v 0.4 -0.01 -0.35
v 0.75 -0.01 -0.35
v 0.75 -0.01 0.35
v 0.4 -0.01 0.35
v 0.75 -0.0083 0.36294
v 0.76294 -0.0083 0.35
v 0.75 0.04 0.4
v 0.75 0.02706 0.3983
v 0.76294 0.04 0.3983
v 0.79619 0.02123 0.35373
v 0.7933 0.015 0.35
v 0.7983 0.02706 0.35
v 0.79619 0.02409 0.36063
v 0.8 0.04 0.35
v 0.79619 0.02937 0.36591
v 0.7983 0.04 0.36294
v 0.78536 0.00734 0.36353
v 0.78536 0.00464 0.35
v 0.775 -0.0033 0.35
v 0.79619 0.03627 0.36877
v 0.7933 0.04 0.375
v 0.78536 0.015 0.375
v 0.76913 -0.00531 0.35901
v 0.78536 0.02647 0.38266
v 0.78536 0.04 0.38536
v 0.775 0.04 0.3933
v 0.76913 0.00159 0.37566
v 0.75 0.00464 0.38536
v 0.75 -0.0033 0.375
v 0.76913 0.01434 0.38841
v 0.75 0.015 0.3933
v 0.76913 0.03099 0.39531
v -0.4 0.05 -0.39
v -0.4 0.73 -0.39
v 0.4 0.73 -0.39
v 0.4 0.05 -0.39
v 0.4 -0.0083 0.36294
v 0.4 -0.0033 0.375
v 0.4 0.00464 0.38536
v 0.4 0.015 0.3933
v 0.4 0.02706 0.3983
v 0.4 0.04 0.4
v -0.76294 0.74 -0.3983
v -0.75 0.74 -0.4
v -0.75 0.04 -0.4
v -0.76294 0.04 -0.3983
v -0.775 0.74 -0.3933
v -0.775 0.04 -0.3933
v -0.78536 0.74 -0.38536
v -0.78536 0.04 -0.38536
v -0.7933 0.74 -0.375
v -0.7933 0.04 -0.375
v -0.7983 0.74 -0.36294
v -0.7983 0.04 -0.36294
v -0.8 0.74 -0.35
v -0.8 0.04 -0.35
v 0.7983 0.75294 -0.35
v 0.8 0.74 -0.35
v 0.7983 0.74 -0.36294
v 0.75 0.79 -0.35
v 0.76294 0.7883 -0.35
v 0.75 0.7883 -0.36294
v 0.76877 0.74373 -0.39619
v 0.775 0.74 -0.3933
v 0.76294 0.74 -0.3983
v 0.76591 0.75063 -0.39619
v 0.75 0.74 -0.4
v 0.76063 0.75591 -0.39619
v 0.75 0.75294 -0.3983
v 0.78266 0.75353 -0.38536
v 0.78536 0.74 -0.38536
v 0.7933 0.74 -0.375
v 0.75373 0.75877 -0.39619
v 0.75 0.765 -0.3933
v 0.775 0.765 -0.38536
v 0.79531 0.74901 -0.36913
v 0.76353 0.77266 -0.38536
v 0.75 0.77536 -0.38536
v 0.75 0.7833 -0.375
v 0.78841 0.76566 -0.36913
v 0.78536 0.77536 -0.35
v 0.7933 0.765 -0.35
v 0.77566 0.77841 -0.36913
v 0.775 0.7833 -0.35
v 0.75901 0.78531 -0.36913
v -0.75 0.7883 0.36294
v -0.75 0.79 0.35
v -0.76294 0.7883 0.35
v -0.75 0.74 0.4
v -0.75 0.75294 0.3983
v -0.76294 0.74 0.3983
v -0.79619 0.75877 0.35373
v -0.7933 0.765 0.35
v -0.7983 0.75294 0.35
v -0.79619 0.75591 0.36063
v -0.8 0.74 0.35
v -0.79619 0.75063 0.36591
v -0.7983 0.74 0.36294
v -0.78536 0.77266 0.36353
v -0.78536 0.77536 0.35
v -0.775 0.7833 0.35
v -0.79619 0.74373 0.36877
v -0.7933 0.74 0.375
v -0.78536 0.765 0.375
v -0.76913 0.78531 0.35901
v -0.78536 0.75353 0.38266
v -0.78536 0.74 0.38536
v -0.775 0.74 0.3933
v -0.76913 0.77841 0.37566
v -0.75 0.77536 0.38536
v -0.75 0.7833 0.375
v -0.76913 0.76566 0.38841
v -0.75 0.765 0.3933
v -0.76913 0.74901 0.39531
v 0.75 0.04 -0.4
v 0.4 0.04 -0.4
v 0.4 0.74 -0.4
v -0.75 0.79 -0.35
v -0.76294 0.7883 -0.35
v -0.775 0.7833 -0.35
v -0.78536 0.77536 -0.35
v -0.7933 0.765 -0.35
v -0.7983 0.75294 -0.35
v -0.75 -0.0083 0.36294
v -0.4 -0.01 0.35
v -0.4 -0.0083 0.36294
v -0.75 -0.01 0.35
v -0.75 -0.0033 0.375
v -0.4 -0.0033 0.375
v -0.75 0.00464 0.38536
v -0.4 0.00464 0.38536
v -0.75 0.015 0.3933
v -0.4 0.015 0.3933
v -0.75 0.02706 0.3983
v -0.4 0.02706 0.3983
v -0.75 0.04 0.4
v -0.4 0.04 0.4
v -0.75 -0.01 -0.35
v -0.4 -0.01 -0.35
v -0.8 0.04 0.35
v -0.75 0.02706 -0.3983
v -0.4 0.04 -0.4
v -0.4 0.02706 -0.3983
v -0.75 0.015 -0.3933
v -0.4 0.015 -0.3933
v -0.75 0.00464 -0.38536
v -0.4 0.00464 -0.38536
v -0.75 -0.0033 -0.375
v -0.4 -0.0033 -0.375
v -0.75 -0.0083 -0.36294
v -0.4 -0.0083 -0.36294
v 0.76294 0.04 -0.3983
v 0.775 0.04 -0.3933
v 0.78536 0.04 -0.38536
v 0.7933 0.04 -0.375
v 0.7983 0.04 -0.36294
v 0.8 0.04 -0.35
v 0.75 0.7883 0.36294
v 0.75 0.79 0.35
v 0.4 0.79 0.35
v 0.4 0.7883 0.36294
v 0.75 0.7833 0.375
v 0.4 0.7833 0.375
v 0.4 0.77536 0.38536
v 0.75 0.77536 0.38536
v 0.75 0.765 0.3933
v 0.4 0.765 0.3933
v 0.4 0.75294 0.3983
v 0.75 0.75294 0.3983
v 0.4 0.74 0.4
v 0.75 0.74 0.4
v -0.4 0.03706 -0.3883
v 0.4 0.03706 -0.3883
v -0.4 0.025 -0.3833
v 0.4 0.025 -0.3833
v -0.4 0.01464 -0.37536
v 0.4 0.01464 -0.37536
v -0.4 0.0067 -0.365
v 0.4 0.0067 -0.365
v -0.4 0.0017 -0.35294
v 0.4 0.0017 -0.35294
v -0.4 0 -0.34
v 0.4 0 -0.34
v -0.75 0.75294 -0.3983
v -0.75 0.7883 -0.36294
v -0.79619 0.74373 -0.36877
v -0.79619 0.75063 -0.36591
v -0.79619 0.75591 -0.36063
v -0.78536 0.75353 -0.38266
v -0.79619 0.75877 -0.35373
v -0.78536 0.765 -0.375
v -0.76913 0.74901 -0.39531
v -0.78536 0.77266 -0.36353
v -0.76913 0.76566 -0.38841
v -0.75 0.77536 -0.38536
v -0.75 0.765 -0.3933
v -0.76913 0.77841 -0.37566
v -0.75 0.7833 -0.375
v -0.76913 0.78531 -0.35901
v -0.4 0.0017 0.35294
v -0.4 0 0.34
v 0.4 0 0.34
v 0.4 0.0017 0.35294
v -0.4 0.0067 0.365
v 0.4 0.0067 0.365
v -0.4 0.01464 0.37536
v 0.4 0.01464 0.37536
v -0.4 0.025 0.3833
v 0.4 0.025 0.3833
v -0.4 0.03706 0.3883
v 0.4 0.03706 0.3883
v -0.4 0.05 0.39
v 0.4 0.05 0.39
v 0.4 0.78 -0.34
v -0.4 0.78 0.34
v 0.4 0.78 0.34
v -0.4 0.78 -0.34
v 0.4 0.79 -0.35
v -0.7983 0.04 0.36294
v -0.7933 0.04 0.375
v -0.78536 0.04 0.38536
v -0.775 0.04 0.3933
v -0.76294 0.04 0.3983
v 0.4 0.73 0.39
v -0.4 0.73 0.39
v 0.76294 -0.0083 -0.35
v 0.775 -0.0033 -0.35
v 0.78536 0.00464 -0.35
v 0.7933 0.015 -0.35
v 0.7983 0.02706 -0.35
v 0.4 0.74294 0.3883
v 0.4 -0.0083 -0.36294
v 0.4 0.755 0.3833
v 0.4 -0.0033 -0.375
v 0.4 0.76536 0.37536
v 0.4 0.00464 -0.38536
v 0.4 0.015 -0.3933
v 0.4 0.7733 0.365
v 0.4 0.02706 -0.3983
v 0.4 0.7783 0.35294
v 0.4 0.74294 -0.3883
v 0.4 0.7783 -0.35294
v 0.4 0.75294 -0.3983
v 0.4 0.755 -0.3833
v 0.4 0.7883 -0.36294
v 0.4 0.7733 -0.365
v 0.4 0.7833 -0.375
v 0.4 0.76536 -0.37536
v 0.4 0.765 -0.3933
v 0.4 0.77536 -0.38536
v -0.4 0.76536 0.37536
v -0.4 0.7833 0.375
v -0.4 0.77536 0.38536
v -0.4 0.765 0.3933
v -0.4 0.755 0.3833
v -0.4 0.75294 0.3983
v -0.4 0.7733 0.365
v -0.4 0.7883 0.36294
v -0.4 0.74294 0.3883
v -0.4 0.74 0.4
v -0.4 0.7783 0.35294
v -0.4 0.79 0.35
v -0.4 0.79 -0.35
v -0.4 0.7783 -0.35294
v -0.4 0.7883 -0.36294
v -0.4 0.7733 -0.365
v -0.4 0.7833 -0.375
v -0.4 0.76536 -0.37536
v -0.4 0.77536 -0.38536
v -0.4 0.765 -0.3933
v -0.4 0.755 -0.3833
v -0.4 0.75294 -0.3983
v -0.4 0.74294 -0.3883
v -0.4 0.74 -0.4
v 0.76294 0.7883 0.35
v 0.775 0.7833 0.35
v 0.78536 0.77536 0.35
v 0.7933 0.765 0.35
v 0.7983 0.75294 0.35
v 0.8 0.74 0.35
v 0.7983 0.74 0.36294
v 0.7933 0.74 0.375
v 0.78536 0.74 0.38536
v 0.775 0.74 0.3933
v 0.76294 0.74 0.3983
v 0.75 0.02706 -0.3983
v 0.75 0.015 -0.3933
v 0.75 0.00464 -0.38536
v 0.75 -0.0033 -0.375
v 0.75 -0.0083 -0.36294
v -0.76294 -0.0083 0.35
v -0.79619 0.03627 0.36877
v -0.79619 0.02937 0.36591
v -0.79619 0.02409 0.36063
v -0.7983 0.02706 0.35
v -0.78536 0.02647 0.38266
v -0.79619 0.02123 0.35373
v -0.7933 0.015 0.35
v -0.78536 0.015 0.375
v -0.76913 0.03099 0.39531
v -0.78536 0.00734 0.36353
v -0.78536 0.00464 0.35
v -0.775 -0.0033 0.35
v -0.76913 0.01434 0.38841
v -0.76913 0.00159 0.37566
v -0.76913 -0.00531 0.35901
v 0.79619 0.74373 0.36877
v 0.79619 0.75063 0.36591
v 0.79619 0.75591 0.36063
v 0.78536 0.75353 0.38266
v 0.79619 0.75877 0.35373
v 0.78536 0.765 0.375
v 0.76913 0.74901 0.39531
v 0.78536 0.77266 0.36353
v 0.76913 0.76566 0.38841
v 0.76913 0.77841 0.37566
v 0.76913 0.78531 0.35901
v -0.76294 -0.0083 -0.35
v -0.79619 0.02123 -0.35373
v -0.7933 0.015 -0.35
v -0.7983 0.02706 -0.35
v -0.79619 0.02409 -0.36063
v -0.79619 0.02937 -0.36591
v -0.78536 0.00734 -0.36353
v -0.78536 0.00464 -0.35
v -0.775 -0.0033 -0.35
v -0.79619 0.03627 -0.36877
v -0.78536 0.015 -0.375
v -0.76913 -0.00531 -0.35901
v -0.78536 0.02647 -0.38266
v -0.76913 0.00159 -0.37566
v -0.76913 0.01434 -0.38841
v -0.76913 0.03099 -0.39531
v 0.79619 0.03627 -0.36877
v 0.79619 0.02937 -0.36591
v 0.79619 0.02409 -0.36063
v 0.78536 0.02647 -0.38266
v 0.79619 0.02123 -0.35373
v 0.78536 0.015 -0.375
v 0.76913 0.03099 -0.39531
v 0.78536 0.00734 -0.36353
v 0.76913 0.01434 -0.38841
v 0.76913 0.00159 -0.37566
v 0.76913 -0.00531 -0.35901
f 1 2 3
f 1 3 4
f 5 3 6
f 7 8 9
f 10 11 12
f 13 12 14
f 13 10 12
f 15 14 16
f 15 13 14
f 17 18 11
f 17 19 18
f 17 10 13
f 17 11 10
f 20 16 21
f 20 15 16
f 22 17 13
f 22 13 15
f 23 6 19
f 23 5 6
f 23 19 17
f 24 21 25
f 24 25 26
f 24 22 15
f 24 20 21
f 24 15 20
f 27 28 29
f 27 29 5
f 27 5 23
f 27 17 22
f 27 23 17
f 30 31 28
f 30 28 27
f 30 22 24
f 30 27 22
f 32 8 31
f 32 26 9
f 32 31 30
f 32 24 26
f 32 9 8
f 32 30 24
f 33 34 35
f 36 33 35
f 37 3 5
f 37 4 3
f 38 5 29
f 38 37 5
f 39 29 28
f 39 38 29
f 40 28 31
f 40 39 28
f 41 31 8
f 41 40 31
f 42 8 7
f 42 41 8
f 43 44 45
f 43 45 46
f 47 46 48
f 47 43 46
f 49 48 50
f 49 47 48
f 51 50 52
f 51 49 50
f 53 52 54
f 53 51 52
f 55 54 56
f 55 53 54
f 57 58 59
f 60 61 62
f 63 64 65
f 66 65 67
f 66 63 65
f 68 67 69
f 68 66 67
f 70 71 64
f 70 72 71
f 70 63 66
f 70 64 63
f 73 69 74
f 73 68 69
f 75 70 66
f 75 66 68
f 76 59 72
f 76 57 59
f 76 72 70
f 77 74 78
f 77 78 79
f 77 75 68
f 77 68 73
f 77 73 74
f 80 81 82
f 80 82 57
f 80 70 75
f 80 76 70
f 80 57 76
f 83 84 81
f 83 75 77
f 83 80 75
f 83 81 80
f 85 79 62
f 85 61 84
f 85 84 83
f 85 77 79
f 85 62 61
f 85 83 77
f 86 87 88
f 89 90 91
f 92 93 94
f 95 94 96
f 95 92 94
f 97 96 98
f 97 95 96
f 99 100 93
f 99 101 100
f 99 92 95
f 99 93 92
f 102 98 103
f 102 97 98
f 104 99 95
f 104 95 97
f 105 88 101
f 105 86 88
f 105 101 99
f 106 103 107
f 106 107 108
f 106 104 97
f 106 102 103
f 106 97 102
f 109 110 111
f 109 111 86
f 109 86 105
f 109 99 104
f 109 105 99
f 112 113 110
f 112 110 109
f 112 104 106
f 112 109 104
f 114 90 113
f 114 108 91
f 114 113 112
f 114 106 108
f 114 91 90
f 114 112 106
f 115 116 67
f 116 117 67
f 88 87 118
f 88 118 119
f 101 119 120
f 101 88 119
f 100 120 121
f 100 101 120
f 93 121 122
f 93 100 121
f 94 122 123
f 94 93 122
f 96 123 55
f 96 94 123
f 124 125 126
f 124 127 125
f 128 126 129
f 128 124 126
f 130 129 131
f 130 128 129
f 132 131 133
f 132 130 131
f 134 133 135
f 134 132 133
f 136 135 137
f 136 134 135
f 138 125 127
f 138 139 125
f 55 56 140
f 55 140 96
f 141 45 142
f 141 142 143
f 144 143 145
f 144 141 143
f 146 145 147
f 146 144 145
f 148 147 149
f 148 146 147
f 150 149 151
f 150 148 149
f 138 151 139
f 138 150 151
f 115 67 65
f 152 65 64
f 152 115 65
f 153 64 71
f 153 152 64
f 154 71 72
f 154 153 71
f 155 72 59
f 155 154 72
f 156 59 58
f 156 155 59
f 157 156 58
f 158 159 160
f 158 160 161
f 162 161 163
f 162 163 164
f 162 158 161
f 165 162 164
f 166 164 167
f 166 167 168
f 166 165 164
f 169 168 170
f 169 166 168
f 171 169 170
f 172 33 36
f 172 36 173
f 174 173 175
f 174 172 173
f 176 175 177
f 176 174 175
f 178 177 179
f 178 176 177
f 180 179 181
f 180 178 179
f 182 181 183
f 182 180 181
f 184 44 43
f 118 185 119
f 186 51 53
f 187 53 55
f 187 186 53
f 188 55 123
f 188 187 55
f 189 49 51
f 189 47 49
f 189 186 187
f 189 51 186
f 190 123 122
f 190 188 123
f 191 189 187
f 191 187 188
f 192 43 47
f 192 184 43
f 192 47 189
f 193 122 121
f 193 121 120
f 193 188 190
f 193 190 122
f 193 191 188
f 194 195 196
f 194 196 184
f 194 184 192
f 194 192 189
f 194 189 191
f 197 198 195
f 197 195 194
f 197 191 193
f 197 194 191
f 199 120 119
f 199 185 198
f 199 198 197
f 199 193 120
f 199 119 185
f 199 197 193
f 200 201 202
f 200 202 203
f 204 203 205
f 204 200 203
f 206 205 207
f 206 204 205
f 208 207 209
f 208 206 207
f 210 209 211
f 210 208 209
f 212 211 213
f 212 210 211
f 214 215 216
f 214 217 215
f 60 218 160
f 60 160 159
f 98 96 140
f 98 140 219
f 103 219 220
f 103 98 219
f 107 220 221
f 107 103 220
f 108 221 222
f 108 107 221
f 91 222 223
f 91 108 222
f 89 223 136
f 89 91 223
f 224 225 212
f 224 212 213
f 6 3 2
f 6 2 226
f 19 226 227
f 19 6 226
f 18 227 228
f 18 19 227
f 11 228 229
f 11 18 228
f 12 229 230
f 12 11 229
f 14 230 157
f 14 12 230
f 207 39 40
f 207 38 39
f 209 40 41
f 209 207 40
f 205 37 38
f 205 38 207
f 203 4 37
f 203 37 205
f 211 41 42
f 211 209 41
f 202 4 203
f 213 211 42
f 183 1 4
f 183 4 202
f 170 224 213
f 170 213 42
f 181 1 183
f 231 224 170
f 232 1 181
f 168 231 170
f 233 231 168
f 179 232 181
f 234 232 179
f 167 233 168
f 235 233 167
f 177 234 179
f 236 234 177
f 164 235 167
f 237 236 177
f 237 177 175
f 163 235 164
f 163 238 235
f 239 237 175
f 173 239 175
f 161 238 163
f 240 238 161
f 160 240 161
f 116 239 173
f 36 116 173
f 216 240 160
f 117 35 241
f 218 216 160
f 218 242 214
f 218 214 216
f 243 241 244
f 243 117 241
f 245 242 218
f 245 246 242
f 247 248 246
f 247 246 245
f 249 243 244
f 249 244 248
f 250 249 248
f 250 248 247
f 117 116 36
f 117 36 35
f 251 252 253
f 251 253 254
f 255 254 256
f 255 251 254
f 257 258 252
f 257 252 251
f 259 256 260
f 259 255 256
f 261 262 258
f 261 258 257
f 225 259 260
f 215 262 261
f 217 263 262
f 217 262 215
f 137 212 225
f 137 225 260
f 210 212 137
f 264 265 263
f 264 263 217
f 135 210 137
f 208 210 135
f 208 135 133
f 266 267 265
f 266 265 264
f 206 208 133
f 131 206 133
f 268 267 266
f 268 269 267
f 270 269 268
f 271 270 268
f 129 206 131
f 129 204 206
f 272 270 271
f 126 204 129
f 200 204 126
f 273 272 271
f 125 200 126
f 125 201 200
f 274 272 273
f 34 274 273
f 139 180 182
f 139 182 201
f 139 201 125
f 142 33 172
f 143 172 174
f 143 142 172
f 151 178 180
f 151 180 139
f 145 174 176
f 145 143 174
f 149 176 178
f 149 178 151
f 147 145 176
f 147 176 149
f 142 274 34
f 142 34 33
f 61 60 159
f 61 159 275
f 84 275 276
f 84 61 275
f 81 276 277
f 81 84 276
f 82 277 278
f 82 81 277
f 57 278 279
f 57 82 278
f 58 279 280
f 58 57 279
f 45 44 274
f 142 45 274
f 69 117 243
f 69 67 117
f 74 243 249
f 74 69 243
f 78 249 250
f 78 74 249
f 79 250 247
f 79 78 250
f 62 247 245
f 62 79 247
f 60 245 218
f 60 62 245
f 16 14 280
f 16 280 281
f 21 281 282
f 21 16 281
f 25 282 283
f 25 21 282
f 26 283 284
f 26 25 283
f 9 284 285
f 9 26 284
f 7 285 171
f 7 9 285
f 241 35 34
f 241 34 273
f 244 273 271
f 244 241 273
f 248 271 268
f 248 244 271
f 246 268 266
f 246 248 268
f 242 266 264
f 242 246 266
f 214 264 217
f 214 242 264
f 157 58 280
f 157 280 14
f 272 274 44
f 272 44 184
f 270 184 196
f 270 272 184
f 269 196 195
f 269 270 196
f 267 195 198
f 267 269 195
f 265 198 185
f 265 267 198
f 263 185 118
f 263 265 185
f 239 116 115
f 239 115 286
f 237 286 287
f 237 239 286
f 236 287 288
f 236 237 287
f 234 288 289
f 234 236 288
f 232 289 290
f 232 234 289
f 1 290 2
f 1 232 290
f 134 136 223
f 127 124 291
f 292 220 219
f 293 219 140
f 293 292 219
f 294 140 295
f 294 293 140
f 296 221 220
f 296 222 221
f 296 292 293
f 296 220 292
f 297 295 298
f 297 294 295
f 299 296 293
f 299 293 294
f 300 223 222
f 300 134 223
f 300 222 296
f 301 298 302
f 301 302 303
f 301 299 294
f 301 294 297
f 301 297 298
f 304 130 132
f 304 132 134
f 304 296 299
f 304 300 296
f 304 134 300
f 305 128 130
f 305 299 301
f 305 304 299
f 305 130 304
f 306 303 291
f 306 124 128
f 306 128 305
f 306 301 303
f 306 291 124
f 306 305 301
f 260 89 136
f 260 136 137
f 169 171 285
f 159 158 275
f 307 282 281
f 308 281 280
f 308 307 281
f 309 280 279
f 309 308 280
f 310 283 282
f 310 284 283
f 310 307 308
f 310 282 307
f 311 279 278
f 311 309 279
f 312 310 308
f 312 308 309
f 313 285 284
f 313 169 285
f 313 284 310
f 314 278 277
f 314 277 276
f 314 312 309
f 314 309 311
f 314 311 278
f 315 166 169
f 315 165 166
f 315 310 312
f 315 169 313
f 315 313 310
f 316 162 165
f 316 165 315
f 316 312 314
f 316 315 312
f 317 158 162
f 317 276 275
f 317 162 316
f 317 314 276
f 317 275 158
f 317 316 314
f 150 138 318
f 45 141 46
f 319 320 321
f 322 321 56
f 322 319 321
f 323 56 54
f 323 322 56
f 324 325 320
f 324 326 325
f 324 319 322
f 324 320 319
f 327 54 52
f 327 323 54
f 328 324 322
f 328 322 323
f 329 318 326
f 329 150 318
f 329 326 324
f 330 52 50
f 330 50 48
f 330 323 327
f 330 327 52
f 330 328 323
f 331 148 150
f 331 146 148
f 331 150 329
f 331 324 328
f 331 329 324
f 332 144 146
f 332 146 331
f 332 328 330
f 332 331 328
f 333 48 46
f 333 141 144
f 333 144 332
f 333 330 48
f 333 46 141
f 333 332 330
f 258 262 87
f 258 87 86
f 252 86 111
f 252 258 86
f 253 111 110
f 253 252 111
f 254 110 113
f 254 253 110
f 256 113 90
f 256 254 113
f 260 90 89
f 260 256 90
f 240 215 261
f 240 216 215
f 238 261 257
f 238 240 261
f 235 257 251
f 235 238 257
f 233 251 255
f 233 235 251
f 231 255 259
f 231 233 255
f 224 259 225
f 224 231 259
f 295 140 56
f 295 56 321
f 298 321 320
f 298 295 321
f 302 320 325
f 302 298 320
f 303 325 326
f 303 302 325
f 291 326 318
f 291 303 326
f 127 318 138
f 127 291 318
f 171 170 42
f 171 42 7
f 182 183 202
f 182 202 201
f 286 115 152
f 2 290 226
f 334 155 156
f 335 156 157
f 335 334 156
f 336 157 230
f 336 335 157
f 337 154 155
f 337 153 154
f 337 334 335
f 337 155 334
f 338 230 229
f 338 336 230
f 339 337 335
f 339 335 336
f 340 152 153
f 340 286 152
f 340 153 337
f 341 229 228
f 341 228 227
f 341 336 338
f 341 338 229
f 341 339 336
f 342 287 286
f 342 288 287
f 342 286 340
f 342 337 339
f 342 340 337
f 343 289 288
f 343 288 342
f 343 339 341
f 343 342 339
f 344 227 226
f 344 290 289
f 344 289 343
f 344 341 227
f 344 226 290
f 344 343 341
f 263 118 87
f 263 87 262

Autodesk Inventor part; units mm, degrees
ref_plane "YZ Plane" through (0, 0, 0) normal (1, 0, 0) x (0, 1, 0)
ref_plane "XZ Plane" through (0, 0, 0) normal (0, 1, 0) x (-1, 0, 0)
ref_plane "XY Plane" through (0, 0, 0) normal (0, 0, 1) x (1, 0, 0)
sketch "Sketch1" plane through (0, 0, 0) normal (0, 0, 1) x (1, 0, 0)
  line L0 (-0.8, 0.79) -> (-0.4, 0.79)
  line L1 (-0.4, 0.79) -> (-0.4, -0.01)
  line L2 (-0.4, -0.01) -> (-0.8, -0.01)
  line L3 (-0.8, -0.01) -> (-0.8, 0.79)
  line L4 (-0.4, 0.78) -> (0.4, 0.78)
  line L5 (0.4, 0.78) -> (0.4, 0)
  line L6 (0.4, 0) -> (-0.4, 0)
  line L7 (-0.4, 0) -> (-0.4, 0.78)
  line L8 (0.4, 0.79) -> (0.8, 0.79)
  line L9 (0.8, 0.79) -> (0.8, -0.01)
  line L10 (0.8, -0.01) -> (0.4, -0.01)
  line L11 (0.4, -0.01) -> (0.4, 0.79)
  point P0 (0, 0)
  point P1 (0, 0.78)
  point P2 (0, 0)
  dimension "d0" = 1.6
  dimension "d1" = 0.8
  dimension "d2" = 0.4
  dimension "d3" = 0.01
  dimension "d6" = 0.01
extrude "Extrusion1" add sketch "Sketch1" along normal mid plane 0.8 contours L0 L1 L2 L3 | L11 L8 L9 L10 L5
extrude "Extrusion2" add sketch "Sketch1" along normal mid plane 0.78 contours L4 L5 L6 L1
fillet "Fillet1" radius 0.05 20 edges at (-0.6, 0.79, 0.4) (-0.6, 0.79, -0.4) (0, 0.78, -0.39) (0, 0.78, 0.39) (-0.6, -0.01, 0.4) (0, 0, 0.39) (0, 0, -0.39) (-0.6, -0.01, -0.4) (0.6, -0.01, -0.4) (0.6, -0.01, 0.4) (0.6, 0.79, 0.4) (0.8, 0.39, 0.4) (0.8, 0.79, 0) (0.6, 0.79, -0.4) (0.8, 0.39, -0.4) (0.8, -0.01, 0) (-0.8, -0.01, 0) (-0.8, 0.39, 0.4) (-0.8, 0.79, 0) (-0.8, 0.39, -0.4)
properties part number "Inductor_1608-0.8mm" material "Copper"
